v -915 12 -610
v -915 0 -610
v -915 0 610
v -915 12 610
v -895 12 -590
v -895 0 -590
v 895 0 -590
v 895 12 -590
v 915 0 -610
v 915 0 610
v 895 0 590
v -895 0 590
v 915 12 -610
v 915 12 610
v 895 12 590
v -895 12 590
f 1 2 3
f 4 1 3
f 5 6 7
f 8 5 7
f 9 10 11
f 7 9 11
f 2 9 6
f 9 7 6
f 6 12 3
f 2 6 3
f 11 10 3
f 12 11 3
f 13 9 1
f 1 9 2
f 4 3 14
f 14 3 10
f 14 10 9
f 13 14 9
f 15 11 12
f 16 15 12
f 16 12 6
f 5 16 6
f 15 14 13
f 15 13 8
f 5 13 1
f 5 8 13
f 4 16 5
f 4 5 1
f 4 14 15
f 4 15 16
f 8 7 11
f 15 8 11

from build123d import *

# Parameters (mm, degrees)
SKETCH_1_W      = 20
SKETCH_1_H      = 600
EXTRUDE_1_DEPTH = 12


with BuildPart() as part:
    # Эскиз1 → Выдавливание1 (new body)
    with BuildSketch(Plane(origin=(0, 0, 0), x_dir=(-1, 0, 0), z_dir=(0, 1, 0))):
        Polygon((-915, -300), (-915, -610), (915, -610), (915, -300), (895, -300), (895, -590), (-895, -590), (-895, -300), align=None)
        Polygon((-895, 300), (-895, 590), (895, 590), (895, 300), (915, 300), (915, 610), (-915, 610), (-915, 300), align=None)
        with Locations((-905, 0)):
            Rectangle(SKETCH_1_W, SKETCH_1_H)
        with Locations((905, 0)):
            Rectangle(SKETCH_1_W, SKETCH_1_H)
    extrude(amount=EXTRUDE_1_DEPTH)


solid = part.part
